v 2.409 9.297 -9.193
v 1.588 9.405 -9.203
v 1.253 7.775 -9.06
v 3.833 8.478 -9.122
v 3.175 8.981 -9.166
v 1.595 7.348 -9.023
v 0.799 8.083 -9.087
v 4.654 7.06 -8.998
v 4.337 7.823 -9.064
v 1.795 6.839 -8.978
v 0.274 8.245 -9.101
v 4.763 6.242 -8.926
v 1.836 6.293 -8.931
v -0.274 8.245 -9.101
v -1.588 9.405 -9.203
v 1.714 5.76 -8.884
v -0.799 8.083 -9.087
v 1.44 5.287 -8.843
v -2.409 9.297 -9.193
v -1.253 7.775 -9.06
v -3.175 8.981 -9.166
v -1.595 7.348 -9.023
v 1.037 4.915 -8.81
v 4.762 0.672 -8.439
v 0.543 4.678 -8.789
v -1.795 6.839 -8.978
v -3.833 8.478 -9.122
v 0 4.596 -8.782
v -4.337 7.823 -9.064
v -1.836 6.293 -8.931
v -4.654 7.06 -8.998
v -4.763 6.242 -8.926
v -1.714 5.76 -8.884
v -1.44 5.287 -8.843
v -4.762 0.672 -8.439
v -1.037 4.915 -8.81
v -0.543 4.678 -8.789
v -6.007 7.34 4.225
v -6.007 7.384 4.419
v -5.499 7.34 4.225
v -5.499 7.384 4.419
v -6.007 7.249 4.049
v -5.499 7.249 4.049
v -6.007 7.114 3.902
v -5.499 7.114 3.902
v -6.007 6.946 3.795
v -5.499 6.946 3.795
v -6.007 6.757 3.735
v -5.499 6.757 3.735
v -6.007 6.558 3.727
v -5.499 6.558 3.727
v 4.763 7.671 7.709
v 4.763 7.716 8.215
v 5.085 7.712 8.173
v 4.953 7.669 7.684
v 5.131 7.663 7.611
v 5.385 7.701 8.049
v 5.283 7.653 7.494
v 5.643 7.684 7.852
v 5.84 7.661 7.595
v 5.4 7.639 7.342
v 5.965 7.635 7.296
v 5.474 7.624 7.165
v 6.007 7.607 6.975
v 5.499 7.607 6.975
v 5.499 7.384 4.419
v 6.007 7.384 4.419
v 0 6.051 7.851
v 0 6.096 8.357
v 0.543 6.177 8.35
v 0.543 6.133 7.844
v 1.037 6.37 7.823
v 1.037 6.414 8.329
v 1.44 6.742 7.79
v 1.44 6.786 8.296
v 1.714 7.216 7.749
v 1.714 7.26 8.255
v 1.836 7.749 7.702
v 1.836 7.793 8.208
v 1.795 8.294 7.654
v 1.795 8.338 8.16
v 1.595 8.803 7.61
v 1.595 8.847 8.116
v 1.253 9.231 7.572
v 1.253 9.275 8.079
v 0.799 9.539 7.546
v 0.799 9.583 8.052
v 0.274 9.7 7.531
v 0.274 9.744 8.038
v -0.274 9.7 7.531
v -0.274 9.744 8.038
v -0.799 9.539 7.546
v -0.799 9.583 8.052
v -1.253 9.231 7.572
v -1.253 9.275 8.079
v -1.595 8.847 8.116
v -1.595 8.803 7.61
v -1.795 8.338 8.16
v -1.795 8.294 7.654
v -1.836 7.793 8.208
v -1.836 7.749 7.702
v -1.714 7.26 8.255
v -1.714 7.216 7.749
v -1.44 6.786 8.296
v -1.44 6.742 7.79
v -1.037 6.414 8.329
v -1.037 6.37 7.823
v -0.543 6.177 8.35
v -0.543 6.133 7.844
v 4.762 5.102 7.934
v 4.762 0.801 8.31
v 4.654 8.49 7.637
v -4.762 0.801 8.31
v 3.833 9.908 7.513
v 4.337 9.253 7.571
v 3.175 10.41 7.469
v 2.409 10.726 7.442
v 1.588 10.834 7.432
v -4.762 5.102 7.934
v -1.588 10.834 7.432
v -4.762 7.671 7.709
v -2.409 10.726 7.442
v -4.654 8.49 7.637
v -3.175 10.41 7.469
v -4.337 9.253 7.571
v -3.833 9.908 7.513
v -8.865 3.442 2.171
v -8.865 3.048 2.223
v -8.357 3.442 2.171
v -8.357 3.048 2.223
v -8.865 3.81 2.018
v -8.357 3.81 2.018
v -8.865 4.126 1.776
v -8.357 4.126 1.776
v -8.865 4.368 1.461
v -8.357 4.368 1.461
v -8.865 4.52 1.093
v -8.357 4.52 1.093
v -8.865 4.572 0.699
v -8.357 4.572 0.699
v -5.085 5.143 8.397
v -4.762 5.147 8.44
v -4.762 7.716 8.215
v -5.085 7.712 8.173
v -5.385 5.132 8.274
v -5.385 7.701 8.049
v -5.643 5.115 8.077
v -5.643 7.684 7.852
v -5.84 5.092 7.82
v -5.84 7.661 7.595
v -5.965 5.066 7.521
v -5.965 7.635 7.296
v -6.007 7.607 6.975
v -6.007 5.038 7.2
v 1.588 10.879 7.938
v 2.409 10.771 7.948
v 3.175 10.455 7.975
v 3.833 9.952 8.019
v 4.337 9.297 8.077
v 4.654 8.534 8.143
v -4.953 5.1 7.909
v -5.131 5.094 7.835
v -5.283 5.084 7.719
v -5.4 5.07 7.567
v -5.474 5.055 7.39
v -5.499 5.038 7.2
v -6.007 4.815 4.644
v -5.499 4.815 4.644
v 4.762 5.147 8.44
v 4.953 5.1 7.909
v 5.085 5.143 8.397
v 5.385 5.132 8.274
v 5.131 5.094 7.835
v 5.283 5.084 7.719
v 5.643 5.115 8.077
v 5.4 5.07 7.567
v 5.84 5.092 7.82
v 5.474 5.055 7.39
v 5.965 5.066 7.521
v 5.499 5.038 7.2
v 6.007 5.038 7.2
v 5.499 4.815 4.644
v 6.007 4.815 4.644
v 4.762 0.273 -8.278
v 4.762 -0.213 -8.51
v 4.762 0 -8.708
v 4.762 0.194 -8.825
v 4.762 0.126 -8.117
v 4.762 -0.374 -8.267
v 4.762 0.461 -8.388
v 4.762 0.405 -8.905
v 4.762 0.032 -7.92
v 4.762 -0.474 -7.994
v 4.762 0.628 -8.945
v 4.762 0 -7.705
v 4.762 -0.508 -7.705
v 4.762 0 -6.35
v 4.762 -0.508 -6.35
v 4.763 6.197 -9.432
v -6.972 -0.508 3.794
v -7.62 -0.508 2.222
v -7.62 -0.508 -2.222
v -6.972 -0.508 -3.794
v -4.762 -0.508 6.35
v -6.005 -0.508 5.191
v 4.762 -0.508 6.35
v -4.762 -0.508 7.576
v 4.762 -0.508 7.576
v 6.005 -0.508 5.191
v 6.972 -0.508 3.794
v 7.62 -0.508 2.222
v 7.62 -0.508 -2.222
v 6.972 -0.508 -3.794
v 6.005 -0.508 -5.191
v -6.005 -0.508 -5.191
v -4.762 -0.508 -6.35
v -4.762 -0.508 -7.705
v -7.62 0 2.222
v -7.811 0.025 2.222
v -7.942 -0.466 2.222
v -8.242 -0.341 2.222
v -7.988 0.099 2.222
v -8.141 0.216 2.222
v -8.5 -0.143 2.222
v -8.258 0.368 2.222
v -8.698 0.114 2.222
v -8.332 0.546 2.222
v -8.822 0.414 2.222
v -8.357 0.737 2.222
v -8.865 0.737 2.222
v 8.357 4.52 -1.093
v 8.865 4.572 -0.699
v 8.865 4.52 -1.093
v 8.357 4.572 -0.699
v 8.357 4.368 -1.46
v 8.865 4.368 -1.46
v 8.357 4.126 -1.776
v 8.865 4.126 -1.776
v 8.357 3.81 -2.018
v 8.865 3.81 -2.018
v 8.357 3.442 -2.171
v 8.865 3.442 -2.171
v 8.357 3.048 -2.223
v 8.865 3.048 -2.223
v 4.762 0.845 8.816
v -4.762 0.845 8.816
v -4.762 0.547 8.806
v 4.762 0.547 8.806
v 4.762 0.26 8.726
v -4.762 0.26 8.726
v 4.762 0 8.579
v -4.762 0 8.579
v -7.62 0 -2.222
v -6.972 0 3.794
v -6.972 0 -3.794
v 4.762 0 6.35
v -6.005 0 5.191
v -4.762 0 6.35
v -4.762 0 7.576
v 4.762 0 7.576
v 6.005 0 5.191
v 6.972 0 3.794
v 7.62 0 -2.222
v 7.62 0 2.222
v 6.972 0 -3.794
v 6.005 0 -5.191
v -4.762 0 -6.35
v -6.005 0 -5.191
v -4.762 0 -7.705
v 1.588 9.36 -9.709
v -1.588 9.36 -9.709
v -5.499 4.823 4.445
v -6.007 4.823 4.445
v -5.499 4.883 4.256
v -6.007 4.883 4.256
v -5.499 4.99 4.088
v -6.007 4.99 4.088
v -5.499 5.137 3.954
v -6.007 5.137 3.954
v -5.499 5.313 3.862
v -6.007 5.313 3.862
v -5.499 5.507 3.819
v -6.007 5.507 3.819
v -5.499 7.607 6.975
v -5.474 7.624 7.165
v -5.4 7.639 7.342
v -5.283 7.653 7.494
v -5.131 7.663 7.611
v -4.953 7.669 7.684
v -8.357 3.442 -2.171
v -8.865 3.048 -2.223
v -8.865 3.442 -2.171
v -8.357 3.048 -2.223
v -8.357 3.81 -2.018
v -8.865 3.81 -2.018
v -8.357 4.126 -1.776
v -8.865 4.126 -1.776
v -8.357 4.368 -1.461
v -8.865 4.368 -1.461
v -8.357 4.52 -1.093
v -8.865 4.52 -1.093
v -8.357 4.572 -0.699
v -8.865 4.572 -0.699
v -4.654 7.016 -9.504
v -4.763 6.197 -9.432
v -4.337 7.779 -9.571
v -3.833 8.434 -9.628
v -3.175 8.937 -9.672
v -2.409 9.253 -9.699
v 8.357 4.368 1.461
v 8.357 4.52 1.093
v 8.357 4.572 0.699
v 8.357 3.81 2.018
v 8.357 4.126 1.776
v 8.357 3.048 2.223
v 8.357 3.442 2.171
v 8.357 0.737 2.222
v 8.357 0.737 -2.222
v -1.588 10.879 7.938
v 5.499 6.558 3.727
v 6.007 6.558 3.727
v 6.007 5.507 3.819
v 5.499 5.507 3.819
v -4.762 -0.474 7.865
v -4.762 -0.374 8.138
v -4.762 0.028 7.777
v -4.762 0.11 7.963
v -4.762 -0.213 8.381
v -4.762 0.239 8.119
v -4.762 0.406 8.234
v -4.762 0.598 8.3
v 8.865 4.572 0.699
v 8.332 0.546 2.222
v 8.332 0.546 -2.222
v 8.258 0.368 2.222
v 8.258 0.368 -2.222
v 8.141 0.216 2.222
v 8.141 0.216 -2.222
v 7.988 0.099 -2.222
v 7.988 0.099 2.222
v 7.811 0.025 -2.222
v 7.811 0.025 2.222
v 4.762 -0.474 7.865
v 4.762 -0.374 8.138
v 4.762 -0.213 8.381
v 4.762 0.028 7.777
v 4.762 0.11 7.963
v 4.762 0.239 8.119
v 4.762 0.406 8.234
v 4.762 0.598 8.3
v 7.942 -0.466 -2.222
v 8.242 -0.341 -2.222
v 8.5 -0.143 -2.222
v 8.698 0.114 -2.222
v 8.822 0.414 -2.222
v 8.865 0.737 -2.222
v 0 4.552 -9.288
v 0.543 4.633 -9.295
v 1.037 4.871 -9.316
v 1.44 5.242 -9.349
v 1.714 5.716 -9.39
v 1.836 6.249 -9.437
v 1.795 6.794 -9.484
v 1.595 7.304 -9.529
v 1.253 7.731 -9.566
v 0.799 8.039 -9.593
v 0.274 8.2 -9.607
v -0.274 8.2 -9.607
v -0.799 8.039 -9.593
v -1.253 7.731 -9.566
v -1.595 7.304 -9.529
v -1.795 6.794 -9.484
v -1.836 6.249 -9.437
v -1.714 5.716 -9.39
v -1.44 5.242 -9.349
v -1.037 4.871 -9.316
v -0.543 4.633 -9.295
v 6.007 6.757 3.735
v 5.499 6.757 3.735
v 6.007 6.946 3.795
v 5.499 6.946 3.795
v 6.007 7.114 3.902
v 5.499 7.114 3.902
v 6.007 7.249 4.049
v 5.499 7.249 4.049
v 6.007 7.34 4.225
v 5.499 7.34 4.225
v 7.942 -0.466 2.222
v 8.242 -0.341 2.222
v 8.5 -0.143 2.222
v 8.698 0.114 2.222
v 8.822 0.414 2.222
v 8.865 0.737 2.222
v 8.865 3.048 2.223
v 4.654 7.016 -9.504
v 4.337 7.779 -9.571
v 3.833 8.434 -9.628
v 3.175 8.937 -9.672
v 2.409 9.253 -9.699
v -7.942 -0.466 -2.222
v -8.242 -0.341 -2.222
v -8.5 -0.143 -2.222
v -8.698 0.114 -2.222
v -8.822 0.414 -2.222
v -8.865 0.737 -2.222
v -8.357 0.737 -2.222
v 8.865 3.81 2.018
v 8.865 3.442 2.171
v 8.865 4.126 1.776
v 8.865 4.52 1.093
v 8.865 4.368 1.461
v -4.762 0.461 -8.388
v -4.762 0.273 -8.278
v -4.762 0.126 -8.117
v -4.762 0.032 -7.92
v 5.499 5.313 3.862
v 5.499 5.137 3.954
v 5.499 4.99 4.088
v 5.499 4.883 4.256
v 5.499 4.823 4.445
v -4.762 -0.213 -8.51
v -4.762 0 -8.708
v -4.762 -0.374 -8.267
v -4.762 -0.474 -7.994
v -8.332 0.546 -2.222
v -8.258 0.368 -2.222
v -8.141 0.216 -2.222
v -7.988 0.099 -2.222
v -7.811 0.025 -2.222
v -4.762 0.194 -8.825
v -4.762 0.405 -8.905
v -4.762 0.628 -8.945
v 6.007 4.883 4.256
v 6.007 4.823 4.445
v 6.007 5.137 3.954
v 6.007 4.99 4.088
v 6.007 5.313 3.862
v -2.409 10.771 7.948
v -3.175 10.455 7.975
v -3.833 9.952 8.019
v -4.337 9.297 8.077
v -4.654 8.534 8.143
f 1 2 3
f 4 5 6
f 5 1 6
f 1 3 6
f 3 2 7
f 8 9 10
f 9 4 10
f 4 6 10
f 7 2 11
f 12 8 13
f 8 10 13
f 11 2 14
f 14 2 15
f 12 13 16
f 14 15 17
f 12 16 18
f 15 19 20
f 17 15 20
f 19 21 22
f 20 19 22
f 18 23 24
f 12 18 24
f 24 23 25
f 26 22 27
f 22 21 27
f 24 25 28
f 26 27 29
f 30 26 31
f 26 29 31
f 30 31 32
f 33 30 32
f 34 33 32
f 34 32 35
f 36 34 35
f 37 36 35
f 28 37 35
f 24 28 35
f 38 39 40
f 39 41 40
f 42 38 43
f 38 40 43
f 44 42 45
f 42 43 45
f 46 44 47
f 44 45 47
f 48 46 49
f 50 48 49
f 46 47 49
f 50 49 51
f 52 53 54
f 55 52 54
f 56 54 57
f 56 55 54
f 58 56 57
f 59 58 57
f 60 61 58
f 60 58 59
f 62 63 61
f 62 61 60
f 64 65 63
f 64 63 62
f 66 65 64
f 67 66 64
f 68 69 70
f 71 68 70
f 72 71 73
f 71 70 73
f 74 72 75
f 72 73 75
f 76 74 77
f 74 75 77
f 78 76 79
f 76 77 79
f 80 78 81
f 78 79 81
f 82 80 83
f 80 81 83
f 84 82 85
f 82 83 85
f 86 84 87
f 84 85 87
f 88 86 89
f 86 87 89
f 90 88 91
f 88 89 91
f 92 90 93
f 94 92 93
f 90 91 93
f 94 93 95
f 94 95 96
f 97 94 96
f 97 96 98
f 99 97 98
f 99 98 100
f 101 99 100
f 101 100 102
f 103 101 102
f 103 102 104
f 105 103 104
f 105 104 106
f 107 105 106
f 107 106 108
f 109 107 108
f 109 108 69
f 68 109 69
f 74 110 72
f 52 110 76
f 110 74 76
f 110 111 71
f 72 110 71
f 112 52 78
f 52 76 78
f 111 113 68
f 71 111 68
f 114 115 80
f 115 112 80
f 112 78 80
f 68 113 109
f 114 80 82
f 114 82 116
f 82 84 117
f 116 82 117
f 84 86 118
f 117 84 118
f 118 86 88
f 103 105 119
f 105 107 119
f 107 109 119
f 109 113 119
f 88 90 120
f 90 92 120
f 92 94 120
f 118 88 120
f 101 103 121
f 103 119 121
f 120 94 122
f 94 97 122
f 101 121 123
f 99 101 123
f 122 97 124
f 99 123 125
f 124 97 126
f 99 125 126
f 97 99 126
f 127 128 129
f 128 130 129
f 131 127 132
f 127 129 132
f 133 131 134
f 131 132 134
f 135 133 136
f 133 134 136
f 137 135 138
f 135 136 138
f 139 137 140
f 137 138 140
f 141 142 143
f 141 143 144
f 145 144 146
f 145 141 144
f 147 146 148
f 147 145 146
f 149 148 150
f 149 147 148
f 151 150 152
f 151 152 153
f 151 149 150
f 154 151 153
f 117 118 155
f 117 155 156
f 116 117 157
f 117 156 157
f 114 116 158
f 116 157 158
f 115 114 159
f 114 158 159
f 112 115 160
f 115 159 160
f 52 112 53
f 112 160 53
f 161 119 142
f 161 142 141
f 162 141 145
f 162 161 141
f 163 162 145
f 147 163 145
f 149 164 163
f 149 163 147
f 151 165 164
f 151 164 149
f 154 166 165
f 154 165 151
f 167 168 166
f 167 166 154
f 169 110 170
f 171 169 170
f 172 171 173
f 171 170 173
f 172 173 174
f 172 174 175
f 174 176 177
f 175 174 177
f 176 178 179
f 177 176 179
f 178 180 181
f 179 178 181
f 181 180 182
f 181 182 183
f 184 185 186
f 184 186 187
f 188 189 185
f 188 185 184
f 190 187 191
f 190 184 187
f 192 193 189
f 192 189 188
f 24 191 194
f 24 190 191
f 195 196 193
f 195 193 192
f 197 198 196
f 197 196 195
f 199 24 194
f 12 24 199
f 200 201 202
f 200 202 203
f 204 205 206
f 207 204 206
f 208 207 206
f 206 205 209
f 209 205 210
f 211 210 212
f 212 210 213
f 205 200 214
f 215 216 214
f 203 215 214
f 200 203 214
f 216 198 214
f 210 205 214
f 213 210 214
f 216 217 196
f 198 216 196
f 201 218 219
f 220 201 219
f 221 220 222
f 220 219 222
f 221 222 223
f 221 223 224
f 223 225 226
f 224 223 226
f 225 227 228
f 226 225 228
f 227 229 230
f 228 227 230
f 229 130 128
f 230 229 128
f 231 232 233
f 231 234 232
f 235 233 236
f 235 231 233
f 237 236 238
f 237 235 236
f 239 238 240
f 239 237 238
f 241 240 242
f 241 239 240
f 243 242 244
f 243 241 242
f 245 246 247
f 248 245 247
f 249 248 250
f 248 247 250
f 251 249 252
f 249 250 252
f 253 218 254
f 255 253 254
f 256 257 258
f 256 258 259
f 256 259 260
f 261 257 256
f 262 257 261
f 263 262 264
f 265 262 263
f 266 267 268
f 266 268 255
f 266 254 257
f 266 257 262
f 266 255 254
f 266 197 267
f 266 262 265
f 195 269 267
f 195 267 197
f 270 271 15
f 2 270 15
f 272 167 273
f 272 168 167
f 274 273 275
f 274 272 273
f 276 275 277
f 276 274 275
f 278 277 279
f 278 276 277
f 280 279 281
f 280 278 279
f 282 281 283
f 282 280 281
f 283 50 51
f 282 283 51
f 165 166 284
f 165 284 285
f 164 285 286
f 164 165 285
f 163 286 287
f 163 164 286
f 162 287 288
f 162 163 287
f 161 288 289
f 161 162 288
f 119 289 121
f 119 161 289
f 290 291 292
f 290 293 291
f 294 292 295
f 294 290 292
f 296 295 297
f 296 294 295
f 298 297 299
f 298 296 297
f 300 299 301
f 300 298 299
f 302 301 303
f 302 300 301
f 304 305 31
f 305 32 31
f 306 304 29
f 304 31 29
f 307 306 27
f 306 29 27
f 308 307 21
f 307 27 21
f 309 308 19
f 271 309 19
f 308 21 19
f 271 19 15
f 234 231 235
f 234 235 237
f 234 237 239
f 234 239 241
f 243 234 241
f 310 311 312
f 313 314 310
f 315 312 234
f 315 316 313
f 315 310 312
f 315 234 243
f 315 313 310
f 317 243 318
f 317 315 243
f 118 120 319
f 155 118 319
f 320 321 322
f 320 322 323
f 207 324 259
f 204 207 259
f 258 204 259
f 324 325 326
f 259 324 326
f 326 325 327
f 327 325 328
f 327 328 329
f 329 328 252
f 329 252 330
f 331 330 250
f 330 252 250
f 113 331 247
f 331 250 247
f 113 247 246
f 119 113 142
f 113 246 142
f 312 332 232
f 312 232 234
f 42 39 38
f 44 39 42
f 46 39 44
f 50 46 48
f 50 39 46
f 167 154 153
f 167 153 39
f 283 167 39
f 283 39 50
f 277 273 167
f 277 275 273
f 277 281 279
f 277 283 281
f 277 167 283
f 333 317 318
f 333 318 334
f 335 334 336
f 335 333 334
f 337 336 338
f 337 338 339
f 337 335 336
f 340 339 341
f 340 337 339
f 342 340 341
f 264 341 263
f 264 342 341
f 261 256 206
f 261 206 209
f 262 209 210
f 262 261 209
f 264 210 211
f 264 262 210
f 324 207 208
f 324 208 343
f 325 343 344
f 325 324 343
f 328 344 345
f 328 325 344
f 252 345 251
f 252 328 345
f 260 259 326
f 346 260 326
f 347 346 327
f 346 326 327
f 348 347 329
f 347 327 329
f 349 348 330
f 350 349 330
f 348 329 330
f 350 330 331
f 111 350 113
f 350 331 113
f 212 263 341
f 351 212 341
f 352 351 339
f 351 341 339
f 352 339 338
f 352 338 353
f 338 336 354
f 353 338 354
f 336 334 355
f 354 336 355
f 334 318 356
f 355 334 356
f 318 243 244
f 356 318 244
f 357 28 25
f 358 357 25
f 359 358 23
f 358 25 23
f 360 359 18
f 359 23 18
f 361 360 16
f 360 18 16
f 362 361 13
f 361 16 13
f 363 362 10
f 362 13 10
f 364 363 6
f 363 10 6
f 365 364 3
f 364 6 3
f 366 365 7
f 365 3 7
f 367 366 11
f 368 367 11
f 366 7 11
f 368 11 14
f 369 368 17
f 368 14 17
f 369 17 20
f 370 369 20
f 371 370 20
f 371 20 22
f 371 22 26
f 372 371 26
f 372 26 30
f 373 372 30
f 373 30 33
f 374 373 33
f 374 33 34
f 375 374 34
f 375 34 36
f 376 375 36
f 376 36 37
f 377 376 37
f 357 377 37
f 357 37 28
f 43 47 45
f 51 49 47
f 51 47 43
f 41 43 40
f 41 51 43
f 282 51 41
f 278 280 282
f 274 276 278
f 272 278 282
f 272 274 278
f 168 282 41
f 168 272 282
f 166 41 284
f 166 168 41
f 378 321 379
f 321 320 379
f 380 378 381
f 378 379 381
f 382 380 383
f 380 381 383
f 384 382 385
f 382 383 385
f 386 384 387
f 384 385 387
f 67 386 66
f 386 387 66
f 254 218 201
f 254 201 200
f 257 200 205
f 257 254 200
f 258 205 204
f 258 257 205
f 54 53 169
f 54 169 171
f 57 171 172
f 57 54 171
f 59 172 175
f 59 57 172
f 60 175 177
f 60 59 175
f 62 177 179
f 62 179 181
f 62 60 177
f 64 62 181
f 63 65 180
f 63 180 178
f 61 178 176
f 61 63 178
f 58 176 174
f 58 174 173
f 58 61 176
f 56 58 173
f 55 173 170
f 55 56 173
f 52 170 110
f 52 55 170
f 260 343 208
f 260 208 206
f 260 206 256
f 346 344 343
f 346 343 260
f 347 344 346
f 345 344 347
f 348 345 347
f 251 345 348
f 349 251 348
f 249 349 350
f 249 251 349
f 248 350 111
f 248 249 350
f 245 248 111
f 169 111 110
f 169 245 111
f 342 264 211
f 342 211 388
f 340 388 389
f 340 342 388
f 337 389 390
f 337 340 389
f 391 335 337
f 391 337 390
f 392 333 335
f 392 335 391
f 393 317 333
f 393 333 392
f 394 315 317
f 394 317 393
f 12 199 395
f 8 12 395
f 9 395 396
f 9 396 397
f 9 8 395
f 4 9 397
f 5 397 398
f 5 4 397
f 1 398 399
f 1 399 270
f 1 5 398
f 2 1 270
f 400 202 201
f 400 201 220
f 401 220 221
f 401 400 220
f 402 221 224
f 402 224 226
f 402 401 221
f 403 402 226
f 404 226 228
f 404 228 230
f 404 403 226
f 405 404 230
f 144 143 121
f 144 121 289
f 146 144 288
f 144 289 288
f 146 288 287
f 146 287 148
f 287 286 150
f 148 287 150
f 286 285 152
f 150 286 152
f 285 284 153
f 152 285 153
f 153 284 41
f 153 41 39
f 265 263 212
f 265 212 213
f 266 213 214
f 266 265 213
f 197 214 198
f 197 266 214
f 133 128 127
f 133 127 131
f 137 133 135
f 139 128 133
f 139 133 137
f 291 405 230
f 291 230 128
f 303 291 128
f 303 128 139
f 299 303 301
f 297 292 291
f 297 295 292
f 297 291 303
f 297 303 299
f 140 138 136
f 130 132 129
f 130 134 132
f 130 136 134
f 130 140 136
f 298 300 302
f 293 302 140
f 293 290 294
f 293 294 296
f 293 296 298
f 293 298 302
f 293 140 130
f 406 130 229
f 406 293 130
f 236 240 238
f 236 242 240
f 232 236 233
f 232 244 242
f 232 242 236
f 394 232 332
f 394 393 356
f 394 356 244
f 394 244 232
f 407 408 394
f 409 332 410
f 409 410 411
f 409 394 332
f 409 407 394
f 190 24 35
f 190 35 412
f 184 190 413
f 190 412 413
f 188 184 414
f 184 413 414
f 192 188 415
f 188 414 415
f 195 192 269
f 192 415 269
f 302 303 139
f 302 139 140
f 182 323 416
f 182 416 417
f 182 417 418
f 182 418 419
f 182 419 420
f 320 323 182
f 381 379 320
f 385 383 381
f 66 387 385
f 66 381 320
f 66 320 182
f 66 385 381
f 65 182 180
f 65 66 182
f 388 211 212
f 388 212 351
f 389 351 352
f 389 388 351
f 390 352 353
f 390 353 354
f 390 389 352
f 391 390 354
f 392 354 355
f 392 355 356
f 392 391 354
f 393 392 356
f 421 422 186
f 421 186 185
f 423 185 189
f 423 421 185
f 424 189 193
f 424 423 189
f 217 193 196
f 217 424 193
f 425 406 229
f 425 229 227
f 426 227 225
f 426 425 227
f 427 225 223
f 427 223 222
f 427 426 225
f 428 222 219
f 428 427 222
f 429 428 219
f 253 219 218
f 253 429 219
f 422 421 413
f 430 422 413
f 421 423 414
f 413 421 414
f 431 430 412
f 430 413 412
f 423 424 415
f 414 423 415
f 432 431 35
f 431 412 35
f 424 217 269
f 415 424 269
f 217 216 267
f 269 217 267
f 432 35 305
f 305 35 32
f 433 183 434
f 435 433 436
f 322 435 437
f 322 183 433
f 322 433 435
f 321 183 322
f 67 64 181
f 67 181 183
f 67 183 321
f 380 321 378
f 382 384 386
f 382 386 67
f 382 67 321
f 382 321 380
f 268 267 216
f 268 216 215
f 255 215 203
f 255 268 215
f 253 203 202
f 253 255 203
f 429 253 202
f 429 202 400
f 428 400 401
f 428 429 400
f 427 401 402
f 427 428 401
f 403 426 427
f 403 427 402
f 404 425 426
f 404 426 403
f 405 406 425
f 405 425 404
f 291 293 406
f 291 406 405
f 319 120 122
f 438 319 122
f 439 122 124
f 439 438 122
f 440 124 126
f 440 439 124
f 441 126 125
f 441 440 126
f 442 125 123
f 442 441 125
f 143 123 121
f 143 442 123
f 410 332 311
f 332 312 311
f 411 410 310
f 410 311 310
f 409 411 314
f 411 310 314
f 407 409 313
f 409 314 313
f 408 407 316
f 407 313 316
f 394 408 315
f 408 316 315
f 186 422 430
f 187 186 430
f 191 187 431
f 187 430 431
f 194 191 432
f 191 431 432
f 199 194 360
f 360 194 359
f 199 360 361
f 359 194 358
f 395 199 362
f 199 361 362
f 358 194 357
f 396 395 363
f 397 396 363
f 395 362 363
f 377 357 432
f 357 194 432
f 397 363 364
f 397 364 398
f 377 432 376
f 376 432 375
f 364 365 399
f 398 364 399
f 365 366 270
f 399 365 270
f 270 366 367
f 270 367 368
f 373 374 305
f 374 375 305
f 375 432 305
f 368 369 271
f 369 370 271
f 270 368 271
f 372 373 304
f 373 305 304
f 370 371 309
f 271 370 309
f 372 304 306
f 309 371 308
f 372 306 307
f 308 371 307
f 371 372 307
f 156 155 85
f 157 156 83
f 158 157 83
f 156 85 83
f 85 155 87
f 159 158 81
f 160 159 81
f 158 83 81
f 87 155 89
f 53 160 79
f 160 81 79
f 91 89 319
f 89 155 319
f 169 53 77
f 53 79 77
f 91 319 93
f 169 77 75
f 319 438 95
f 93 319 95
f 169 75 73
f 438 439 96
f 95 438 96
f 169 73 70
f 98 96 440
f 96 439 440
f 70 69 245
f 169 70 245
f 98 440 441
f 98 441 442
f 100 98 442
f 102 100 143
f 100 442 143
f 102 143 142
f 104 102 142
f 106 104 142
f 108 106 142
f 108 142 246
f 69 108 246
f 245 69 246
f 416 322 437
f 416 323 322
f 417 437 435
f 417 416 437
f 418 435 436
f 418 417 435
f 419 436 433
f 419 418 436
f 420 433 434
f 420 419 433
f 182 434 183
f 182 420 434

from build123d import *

# Parameters (mm, degrees)
BASE_FLANGE1_DEPTH      = 0.508
EDGE_FLANGE2_START      = -4.7625
EDGE_FLANGE2_DEPTH      = 9.525
EDGE_FLANGE2_2_DEPTH    = 9.525
EDGE_FLANGE3_START      = -4.7625
EDGE_FLANGE3_DEPTH      = 9.525
EDGE_FLANGE3_2_DEPTH    = 9.525
FILLET1_R               = 3.175
SKETCH17_R              = 1.8415
CUT_EXTRUDE1_DEPTH      = 23.441501951
EDGE_FLANGE4_DEPTH      = 4.445
EDGE_FLANGE4_BEND_DEPTH = 4.445
FILLET2_R               = 1.524
EDGE_FLANGE5_DEPTH      = 2.57875744
EDGE_FLANGE5_BEND_DEPTH = 2.57875744
FILLET3_R               = 0.762


# Read off the part's stored shape, not the designer's step: Edge-Flange2, Edge-Flange3
# Sheet-metal steps are written as plain solids
with BuildPart() as part:
    # Sketch1 → Base-Flange1 (new body)
    with BuildSketch(Plane(origin=(0, 0, 0), x_dir=(1, 0, 0), z_dir=(0, 1, 0))):
        with BuildLine():
            Line((-4.7625, -6.35), (-4.7625, -8.89))
            Line((-4.7625, -8.89), (4.7625, -8.89))
            Line((4.7625, -8.89), (4.7625, -6.35))
            ThreePointArc((4.7625, -6.35), (6.526150521, -4.518104207), (7.62, -2.2225))
            Line((7.62, -2.2225), (7.62, 2.2225))
            ThreePointArc((7.62, 2.2225), (6.526150521, 4.518104207), (4.7625, 6.35))
            Line((4.7625, 6.35), (4.7625, 8.89))
            Line((4.7625, 8.89), (-4.7625, 8.89))
            Line((-4.7625, 8.89), (-4.7625, 6.35))
            ThreePointArc((-4.7625, 6.35), (-6.526150521, 4.518104207), (-7.62, 2.2225))
            Line((-7.62, 2.2225), (-7.62, -2.2225))
            ThreePointArc((-7.62, -2.2225), (-6.526150521, -4.518104207), (-4.7625, -6.35))
        make_face()
    extrude(amount=-BASE_FLANGE1_DEPTH)

    # Edge-Flange2 outline → Edge-Flange2 (cut)
    with BuildSketch(Plane.YZ.offset(EDGE_FLANGE2_START)):
        with BuildLine():
            Line((0, -8.89), (0, -8.708309596))
            ThreePointArc((0, -8.708309596), (-0.373760644, -8.267342948), (-0.508, -7.70508998))
            Line((-0.508, -7.70508998), (-0.508, -8.89))
            Line((-0.508, -8.89), (0, -8.89))
        make_face()
    extrude(amount=EDGE_FLANGE2_DEPTH, mode=Mode.SUBTRACT)

    # Edge-Flange2 2 outline → Edge-Flange2 2 (add)
    with BuildSketch(Plane.YZ.offset(EDGE_FLANGE2_START)):
        with BuildLine():
            ThreePointArc((0, -8.708309596), (0.297808861, -8.869775128), (0.628125963, -8.944953901))
            Line((0.628125963, -8.944953901), (9.360304679, -9.708920547))
            Line((9.360304679, -9.708920547), (9.404579797, -9.20285364))
            Line((9.404579797, -9.20285364), (0.67240108, -8.438886994))
            ThreePointArc((0.67240108, -8.438886994), (0.193521514, -8.202729727), (0, -7.70508998))
            Line((0, -7.70508998), (0, -8.708309596))
        make_face()
    extrude(amount=EDGE_FLANGE2_2_DEPTH)

    # Edge-Flange3 outline → Edge-Flange3 (cut)
    with BuildSketch(Plane.YZ.offset(EDGE_FLANGE3_START)):
        with BuildLine():
            ThreePointArc((-0.508, 7.576201681), (-0.373760644, 8.138454649), (0, 8.579421297))
            Line((0, 8.579421297), (0, 8.89))
            Line((0, 8.89), (-0.508, 8.89))
            Line((-0.508, 8.89), (-0.508, 7.576201681))
        make_face()
    extrude(amount=EDGE_FLANGE3_DEPTH, mode=Mode.SUBTRACT)

    # Edge-Flange3 2 outline → Edge-Flange3 2 (add)
    with BuildSketch(Plane.YZ.offset(EDGE_FLANGE3_START)):
        with BuildLine():
            Line((10.878505399, 7.938254101), (0.845074037, 8.816065602))
            ThreePointArc((0.845074037, 8.816065602), (0.400987593, 8.774698018), (0, 8.579421297))
            Line((0, 8.579421297), (0, 7.576201681))
            ThreePointArc((0, 7.576201681), (0.238960253, 8.119280167), (0.80079892, 8.309998695))
            Line((0.80079892, 8.309998695), (10.834230282, 7.432187195))
            Line((10.834230282, 7.432187195), (10.878505399, 7.938254101))
        make_face()
    extrude(amount=EDGE_FLANGE3_2_DEPTH)

    # Fillet1
    fillet1_edges = [part.edges().sort_by_distance(p)[0] for p in [
        (4.7625, 9.382442238, -9.455887093),
        (-4.7625, 9.382442238, -9.455887093),
        (-4.7625, 10.85636784, 7.685220648),
        (4.7625, 10.85636784, 7.685220648),
    ]]
    fillet(fillet1_edges, radius=FILLET1_R)

    # Sketch17 → Cut-Extrude1 (cut, through all)
    with BuildSketch(Plane(origin=(0, 0.77186615, 8.822470462), x_dir=(1, 0, 0), z_dir=(0, 0.08715574274765484, 0.9961946980917459))):
        with Locations(Location((0, 7.18548753, 0), (0, 0, 270))):
            Circle(SKETCH17_R)
    extrude(amount=-CUT_EXTRUDE1_DEPTH, mode=Mode.SUBTRACT)

    # Edge-Flange4 section (across the edge) → Edge-Flange4 (add)
    with BuildSketch(Plane(origin=(-8.3566, 0, -2.2225), x_dir=(1, 0, 0), z_dir=(0, 0, 1))):
        with BuildLine():
            Line((-0.508, 0.7366), (-0.508, 4.572))
            Line((-0.508, 4.572), (0, 4.572))
            Line((0, 4.572), (0, 0.7366))
            ThreePointArc((0, 0.7366), (0.215745145, 0.215745145), (0.7366, 0))
            Line((0.7366, 0), (0.7366, -0.508))
            ThreePointArc((0.7366, -0.508), (-0.1434651, -0.1434651), (-0.508, 0.7366))
        make_face()
    extrude(amount=EDGE_FLANGE4_DEPTH)

    # Edge-Flange4 section 2 (across the edge) → Edge-Flange4 bend (add)
    with BuildSketch(Plane(origin=(8.3566, 0, 2.2225), x_dir=(-1, 0, 0), z_dir=(0, 0, -1))):
        with BuildLine():
            Line((-0.508, 0.7366), (-0.508, 4.572))
            Line((-0.508, 4.572), (0, 4.572))
            Line((0, 4.572), (0, 0.7366))
            ThreePointArc((0, 0.7366), (0.215745145, 0.215745145), (0.7366, 0))
            Line((0.7366, 0), (0.7366, -0.508))
            ThreePointArc((0.7366, -0.508), (-0.1434651, -0.1434651), (-0.508, 0.7366))
        make_face()
    extrude(amount=EDGE_FLANGE4_BEND_DEPTH)

    # Fillet2
    fillet2_edges = [part.edges().sort_by_distance(p)[0] for p in [
        (-8.6106, 4.572, -2.2225),
        (-8.6106, 4.572, 2.2225),
        (8.6106, 4.572, 2.2225),
        (8.6106, 4.572, -2.2225),
    ]]
    fillet(fillet2_edges, radius=FILLET2_R)

    # Edge-Flange5 section (across the edge) → Edge-Flange5 (add)
    with BuildSketch(Plane(origin=(-5.4991, 5.102367626, 7.933660198), x_dir=(1, 0, 0), z_dir=(0, 0.9961946980917459, -0.08715574274765468))):
        with BuildLine():
            Line((-0.508, 0.7366), (-0.508, 4.064))
            Line((-0.508, 4.064), (0, 4.064))
            Line((0, 4.064), (0, 0.7366))
            ThreePointArc((0, 0.7366), (0.215745145, 0.215745145), (0.7366, 0))
            Line((0.7366, 0), (0.7366, -0.508))
            ThreePointArc((0.7366, -0.508), (-0.1434651, -0.1434651), (-0.508, 0.7366))
        make_face()
    extrude(amount=EDGE_FLANGE5_DEPTH)

    # Edge-Flange5 section 2 (across the edge) → Edge-Flange5 bend (add)
    with BuildSketch(Plane(origin=(5.4991, 7.671312115, 7.708906678), x_dir=(-1, 0, 0), z_dir=(0, -0.9961946980917459, 0.08715574274765468))):
        with BuildLine():
            Line((-0.508, 0.7366), (-0.508, 4.064))
            Line((-0.508, 4.064), (0, 4.064))
            Line((0, 4.064), (0, 0.7366))
            ThreePointArc((0, 0.7366), (0.215745145, 0.215745145), (0.7366, 0))
            Line((0.7366, 0), (0.7366, -0.508))
            ThreePointArc((0.7366, -0.508), (-0.1434651, -0.1434651), (-0.508, 0.7366))
        make_face()
    extrude(amount=EDGE_FLANGE5_BEND_DEPTH)

    # Fillet3
    fillet3_edges = [part.edges().sort_by_distance(p)[0] for p in [
        (-5.7531, 4.748166688, 3.885124945),
        (-5.7531, 7.317111177, 3.660371425),
        (5.7531, 7.317111177, 3.660371425),
        (5.7531, 4.748166688, 3.885124945),
    ]]
    fillet(fillet3_edges, radius=FILLET3_R)


solid = part.part
